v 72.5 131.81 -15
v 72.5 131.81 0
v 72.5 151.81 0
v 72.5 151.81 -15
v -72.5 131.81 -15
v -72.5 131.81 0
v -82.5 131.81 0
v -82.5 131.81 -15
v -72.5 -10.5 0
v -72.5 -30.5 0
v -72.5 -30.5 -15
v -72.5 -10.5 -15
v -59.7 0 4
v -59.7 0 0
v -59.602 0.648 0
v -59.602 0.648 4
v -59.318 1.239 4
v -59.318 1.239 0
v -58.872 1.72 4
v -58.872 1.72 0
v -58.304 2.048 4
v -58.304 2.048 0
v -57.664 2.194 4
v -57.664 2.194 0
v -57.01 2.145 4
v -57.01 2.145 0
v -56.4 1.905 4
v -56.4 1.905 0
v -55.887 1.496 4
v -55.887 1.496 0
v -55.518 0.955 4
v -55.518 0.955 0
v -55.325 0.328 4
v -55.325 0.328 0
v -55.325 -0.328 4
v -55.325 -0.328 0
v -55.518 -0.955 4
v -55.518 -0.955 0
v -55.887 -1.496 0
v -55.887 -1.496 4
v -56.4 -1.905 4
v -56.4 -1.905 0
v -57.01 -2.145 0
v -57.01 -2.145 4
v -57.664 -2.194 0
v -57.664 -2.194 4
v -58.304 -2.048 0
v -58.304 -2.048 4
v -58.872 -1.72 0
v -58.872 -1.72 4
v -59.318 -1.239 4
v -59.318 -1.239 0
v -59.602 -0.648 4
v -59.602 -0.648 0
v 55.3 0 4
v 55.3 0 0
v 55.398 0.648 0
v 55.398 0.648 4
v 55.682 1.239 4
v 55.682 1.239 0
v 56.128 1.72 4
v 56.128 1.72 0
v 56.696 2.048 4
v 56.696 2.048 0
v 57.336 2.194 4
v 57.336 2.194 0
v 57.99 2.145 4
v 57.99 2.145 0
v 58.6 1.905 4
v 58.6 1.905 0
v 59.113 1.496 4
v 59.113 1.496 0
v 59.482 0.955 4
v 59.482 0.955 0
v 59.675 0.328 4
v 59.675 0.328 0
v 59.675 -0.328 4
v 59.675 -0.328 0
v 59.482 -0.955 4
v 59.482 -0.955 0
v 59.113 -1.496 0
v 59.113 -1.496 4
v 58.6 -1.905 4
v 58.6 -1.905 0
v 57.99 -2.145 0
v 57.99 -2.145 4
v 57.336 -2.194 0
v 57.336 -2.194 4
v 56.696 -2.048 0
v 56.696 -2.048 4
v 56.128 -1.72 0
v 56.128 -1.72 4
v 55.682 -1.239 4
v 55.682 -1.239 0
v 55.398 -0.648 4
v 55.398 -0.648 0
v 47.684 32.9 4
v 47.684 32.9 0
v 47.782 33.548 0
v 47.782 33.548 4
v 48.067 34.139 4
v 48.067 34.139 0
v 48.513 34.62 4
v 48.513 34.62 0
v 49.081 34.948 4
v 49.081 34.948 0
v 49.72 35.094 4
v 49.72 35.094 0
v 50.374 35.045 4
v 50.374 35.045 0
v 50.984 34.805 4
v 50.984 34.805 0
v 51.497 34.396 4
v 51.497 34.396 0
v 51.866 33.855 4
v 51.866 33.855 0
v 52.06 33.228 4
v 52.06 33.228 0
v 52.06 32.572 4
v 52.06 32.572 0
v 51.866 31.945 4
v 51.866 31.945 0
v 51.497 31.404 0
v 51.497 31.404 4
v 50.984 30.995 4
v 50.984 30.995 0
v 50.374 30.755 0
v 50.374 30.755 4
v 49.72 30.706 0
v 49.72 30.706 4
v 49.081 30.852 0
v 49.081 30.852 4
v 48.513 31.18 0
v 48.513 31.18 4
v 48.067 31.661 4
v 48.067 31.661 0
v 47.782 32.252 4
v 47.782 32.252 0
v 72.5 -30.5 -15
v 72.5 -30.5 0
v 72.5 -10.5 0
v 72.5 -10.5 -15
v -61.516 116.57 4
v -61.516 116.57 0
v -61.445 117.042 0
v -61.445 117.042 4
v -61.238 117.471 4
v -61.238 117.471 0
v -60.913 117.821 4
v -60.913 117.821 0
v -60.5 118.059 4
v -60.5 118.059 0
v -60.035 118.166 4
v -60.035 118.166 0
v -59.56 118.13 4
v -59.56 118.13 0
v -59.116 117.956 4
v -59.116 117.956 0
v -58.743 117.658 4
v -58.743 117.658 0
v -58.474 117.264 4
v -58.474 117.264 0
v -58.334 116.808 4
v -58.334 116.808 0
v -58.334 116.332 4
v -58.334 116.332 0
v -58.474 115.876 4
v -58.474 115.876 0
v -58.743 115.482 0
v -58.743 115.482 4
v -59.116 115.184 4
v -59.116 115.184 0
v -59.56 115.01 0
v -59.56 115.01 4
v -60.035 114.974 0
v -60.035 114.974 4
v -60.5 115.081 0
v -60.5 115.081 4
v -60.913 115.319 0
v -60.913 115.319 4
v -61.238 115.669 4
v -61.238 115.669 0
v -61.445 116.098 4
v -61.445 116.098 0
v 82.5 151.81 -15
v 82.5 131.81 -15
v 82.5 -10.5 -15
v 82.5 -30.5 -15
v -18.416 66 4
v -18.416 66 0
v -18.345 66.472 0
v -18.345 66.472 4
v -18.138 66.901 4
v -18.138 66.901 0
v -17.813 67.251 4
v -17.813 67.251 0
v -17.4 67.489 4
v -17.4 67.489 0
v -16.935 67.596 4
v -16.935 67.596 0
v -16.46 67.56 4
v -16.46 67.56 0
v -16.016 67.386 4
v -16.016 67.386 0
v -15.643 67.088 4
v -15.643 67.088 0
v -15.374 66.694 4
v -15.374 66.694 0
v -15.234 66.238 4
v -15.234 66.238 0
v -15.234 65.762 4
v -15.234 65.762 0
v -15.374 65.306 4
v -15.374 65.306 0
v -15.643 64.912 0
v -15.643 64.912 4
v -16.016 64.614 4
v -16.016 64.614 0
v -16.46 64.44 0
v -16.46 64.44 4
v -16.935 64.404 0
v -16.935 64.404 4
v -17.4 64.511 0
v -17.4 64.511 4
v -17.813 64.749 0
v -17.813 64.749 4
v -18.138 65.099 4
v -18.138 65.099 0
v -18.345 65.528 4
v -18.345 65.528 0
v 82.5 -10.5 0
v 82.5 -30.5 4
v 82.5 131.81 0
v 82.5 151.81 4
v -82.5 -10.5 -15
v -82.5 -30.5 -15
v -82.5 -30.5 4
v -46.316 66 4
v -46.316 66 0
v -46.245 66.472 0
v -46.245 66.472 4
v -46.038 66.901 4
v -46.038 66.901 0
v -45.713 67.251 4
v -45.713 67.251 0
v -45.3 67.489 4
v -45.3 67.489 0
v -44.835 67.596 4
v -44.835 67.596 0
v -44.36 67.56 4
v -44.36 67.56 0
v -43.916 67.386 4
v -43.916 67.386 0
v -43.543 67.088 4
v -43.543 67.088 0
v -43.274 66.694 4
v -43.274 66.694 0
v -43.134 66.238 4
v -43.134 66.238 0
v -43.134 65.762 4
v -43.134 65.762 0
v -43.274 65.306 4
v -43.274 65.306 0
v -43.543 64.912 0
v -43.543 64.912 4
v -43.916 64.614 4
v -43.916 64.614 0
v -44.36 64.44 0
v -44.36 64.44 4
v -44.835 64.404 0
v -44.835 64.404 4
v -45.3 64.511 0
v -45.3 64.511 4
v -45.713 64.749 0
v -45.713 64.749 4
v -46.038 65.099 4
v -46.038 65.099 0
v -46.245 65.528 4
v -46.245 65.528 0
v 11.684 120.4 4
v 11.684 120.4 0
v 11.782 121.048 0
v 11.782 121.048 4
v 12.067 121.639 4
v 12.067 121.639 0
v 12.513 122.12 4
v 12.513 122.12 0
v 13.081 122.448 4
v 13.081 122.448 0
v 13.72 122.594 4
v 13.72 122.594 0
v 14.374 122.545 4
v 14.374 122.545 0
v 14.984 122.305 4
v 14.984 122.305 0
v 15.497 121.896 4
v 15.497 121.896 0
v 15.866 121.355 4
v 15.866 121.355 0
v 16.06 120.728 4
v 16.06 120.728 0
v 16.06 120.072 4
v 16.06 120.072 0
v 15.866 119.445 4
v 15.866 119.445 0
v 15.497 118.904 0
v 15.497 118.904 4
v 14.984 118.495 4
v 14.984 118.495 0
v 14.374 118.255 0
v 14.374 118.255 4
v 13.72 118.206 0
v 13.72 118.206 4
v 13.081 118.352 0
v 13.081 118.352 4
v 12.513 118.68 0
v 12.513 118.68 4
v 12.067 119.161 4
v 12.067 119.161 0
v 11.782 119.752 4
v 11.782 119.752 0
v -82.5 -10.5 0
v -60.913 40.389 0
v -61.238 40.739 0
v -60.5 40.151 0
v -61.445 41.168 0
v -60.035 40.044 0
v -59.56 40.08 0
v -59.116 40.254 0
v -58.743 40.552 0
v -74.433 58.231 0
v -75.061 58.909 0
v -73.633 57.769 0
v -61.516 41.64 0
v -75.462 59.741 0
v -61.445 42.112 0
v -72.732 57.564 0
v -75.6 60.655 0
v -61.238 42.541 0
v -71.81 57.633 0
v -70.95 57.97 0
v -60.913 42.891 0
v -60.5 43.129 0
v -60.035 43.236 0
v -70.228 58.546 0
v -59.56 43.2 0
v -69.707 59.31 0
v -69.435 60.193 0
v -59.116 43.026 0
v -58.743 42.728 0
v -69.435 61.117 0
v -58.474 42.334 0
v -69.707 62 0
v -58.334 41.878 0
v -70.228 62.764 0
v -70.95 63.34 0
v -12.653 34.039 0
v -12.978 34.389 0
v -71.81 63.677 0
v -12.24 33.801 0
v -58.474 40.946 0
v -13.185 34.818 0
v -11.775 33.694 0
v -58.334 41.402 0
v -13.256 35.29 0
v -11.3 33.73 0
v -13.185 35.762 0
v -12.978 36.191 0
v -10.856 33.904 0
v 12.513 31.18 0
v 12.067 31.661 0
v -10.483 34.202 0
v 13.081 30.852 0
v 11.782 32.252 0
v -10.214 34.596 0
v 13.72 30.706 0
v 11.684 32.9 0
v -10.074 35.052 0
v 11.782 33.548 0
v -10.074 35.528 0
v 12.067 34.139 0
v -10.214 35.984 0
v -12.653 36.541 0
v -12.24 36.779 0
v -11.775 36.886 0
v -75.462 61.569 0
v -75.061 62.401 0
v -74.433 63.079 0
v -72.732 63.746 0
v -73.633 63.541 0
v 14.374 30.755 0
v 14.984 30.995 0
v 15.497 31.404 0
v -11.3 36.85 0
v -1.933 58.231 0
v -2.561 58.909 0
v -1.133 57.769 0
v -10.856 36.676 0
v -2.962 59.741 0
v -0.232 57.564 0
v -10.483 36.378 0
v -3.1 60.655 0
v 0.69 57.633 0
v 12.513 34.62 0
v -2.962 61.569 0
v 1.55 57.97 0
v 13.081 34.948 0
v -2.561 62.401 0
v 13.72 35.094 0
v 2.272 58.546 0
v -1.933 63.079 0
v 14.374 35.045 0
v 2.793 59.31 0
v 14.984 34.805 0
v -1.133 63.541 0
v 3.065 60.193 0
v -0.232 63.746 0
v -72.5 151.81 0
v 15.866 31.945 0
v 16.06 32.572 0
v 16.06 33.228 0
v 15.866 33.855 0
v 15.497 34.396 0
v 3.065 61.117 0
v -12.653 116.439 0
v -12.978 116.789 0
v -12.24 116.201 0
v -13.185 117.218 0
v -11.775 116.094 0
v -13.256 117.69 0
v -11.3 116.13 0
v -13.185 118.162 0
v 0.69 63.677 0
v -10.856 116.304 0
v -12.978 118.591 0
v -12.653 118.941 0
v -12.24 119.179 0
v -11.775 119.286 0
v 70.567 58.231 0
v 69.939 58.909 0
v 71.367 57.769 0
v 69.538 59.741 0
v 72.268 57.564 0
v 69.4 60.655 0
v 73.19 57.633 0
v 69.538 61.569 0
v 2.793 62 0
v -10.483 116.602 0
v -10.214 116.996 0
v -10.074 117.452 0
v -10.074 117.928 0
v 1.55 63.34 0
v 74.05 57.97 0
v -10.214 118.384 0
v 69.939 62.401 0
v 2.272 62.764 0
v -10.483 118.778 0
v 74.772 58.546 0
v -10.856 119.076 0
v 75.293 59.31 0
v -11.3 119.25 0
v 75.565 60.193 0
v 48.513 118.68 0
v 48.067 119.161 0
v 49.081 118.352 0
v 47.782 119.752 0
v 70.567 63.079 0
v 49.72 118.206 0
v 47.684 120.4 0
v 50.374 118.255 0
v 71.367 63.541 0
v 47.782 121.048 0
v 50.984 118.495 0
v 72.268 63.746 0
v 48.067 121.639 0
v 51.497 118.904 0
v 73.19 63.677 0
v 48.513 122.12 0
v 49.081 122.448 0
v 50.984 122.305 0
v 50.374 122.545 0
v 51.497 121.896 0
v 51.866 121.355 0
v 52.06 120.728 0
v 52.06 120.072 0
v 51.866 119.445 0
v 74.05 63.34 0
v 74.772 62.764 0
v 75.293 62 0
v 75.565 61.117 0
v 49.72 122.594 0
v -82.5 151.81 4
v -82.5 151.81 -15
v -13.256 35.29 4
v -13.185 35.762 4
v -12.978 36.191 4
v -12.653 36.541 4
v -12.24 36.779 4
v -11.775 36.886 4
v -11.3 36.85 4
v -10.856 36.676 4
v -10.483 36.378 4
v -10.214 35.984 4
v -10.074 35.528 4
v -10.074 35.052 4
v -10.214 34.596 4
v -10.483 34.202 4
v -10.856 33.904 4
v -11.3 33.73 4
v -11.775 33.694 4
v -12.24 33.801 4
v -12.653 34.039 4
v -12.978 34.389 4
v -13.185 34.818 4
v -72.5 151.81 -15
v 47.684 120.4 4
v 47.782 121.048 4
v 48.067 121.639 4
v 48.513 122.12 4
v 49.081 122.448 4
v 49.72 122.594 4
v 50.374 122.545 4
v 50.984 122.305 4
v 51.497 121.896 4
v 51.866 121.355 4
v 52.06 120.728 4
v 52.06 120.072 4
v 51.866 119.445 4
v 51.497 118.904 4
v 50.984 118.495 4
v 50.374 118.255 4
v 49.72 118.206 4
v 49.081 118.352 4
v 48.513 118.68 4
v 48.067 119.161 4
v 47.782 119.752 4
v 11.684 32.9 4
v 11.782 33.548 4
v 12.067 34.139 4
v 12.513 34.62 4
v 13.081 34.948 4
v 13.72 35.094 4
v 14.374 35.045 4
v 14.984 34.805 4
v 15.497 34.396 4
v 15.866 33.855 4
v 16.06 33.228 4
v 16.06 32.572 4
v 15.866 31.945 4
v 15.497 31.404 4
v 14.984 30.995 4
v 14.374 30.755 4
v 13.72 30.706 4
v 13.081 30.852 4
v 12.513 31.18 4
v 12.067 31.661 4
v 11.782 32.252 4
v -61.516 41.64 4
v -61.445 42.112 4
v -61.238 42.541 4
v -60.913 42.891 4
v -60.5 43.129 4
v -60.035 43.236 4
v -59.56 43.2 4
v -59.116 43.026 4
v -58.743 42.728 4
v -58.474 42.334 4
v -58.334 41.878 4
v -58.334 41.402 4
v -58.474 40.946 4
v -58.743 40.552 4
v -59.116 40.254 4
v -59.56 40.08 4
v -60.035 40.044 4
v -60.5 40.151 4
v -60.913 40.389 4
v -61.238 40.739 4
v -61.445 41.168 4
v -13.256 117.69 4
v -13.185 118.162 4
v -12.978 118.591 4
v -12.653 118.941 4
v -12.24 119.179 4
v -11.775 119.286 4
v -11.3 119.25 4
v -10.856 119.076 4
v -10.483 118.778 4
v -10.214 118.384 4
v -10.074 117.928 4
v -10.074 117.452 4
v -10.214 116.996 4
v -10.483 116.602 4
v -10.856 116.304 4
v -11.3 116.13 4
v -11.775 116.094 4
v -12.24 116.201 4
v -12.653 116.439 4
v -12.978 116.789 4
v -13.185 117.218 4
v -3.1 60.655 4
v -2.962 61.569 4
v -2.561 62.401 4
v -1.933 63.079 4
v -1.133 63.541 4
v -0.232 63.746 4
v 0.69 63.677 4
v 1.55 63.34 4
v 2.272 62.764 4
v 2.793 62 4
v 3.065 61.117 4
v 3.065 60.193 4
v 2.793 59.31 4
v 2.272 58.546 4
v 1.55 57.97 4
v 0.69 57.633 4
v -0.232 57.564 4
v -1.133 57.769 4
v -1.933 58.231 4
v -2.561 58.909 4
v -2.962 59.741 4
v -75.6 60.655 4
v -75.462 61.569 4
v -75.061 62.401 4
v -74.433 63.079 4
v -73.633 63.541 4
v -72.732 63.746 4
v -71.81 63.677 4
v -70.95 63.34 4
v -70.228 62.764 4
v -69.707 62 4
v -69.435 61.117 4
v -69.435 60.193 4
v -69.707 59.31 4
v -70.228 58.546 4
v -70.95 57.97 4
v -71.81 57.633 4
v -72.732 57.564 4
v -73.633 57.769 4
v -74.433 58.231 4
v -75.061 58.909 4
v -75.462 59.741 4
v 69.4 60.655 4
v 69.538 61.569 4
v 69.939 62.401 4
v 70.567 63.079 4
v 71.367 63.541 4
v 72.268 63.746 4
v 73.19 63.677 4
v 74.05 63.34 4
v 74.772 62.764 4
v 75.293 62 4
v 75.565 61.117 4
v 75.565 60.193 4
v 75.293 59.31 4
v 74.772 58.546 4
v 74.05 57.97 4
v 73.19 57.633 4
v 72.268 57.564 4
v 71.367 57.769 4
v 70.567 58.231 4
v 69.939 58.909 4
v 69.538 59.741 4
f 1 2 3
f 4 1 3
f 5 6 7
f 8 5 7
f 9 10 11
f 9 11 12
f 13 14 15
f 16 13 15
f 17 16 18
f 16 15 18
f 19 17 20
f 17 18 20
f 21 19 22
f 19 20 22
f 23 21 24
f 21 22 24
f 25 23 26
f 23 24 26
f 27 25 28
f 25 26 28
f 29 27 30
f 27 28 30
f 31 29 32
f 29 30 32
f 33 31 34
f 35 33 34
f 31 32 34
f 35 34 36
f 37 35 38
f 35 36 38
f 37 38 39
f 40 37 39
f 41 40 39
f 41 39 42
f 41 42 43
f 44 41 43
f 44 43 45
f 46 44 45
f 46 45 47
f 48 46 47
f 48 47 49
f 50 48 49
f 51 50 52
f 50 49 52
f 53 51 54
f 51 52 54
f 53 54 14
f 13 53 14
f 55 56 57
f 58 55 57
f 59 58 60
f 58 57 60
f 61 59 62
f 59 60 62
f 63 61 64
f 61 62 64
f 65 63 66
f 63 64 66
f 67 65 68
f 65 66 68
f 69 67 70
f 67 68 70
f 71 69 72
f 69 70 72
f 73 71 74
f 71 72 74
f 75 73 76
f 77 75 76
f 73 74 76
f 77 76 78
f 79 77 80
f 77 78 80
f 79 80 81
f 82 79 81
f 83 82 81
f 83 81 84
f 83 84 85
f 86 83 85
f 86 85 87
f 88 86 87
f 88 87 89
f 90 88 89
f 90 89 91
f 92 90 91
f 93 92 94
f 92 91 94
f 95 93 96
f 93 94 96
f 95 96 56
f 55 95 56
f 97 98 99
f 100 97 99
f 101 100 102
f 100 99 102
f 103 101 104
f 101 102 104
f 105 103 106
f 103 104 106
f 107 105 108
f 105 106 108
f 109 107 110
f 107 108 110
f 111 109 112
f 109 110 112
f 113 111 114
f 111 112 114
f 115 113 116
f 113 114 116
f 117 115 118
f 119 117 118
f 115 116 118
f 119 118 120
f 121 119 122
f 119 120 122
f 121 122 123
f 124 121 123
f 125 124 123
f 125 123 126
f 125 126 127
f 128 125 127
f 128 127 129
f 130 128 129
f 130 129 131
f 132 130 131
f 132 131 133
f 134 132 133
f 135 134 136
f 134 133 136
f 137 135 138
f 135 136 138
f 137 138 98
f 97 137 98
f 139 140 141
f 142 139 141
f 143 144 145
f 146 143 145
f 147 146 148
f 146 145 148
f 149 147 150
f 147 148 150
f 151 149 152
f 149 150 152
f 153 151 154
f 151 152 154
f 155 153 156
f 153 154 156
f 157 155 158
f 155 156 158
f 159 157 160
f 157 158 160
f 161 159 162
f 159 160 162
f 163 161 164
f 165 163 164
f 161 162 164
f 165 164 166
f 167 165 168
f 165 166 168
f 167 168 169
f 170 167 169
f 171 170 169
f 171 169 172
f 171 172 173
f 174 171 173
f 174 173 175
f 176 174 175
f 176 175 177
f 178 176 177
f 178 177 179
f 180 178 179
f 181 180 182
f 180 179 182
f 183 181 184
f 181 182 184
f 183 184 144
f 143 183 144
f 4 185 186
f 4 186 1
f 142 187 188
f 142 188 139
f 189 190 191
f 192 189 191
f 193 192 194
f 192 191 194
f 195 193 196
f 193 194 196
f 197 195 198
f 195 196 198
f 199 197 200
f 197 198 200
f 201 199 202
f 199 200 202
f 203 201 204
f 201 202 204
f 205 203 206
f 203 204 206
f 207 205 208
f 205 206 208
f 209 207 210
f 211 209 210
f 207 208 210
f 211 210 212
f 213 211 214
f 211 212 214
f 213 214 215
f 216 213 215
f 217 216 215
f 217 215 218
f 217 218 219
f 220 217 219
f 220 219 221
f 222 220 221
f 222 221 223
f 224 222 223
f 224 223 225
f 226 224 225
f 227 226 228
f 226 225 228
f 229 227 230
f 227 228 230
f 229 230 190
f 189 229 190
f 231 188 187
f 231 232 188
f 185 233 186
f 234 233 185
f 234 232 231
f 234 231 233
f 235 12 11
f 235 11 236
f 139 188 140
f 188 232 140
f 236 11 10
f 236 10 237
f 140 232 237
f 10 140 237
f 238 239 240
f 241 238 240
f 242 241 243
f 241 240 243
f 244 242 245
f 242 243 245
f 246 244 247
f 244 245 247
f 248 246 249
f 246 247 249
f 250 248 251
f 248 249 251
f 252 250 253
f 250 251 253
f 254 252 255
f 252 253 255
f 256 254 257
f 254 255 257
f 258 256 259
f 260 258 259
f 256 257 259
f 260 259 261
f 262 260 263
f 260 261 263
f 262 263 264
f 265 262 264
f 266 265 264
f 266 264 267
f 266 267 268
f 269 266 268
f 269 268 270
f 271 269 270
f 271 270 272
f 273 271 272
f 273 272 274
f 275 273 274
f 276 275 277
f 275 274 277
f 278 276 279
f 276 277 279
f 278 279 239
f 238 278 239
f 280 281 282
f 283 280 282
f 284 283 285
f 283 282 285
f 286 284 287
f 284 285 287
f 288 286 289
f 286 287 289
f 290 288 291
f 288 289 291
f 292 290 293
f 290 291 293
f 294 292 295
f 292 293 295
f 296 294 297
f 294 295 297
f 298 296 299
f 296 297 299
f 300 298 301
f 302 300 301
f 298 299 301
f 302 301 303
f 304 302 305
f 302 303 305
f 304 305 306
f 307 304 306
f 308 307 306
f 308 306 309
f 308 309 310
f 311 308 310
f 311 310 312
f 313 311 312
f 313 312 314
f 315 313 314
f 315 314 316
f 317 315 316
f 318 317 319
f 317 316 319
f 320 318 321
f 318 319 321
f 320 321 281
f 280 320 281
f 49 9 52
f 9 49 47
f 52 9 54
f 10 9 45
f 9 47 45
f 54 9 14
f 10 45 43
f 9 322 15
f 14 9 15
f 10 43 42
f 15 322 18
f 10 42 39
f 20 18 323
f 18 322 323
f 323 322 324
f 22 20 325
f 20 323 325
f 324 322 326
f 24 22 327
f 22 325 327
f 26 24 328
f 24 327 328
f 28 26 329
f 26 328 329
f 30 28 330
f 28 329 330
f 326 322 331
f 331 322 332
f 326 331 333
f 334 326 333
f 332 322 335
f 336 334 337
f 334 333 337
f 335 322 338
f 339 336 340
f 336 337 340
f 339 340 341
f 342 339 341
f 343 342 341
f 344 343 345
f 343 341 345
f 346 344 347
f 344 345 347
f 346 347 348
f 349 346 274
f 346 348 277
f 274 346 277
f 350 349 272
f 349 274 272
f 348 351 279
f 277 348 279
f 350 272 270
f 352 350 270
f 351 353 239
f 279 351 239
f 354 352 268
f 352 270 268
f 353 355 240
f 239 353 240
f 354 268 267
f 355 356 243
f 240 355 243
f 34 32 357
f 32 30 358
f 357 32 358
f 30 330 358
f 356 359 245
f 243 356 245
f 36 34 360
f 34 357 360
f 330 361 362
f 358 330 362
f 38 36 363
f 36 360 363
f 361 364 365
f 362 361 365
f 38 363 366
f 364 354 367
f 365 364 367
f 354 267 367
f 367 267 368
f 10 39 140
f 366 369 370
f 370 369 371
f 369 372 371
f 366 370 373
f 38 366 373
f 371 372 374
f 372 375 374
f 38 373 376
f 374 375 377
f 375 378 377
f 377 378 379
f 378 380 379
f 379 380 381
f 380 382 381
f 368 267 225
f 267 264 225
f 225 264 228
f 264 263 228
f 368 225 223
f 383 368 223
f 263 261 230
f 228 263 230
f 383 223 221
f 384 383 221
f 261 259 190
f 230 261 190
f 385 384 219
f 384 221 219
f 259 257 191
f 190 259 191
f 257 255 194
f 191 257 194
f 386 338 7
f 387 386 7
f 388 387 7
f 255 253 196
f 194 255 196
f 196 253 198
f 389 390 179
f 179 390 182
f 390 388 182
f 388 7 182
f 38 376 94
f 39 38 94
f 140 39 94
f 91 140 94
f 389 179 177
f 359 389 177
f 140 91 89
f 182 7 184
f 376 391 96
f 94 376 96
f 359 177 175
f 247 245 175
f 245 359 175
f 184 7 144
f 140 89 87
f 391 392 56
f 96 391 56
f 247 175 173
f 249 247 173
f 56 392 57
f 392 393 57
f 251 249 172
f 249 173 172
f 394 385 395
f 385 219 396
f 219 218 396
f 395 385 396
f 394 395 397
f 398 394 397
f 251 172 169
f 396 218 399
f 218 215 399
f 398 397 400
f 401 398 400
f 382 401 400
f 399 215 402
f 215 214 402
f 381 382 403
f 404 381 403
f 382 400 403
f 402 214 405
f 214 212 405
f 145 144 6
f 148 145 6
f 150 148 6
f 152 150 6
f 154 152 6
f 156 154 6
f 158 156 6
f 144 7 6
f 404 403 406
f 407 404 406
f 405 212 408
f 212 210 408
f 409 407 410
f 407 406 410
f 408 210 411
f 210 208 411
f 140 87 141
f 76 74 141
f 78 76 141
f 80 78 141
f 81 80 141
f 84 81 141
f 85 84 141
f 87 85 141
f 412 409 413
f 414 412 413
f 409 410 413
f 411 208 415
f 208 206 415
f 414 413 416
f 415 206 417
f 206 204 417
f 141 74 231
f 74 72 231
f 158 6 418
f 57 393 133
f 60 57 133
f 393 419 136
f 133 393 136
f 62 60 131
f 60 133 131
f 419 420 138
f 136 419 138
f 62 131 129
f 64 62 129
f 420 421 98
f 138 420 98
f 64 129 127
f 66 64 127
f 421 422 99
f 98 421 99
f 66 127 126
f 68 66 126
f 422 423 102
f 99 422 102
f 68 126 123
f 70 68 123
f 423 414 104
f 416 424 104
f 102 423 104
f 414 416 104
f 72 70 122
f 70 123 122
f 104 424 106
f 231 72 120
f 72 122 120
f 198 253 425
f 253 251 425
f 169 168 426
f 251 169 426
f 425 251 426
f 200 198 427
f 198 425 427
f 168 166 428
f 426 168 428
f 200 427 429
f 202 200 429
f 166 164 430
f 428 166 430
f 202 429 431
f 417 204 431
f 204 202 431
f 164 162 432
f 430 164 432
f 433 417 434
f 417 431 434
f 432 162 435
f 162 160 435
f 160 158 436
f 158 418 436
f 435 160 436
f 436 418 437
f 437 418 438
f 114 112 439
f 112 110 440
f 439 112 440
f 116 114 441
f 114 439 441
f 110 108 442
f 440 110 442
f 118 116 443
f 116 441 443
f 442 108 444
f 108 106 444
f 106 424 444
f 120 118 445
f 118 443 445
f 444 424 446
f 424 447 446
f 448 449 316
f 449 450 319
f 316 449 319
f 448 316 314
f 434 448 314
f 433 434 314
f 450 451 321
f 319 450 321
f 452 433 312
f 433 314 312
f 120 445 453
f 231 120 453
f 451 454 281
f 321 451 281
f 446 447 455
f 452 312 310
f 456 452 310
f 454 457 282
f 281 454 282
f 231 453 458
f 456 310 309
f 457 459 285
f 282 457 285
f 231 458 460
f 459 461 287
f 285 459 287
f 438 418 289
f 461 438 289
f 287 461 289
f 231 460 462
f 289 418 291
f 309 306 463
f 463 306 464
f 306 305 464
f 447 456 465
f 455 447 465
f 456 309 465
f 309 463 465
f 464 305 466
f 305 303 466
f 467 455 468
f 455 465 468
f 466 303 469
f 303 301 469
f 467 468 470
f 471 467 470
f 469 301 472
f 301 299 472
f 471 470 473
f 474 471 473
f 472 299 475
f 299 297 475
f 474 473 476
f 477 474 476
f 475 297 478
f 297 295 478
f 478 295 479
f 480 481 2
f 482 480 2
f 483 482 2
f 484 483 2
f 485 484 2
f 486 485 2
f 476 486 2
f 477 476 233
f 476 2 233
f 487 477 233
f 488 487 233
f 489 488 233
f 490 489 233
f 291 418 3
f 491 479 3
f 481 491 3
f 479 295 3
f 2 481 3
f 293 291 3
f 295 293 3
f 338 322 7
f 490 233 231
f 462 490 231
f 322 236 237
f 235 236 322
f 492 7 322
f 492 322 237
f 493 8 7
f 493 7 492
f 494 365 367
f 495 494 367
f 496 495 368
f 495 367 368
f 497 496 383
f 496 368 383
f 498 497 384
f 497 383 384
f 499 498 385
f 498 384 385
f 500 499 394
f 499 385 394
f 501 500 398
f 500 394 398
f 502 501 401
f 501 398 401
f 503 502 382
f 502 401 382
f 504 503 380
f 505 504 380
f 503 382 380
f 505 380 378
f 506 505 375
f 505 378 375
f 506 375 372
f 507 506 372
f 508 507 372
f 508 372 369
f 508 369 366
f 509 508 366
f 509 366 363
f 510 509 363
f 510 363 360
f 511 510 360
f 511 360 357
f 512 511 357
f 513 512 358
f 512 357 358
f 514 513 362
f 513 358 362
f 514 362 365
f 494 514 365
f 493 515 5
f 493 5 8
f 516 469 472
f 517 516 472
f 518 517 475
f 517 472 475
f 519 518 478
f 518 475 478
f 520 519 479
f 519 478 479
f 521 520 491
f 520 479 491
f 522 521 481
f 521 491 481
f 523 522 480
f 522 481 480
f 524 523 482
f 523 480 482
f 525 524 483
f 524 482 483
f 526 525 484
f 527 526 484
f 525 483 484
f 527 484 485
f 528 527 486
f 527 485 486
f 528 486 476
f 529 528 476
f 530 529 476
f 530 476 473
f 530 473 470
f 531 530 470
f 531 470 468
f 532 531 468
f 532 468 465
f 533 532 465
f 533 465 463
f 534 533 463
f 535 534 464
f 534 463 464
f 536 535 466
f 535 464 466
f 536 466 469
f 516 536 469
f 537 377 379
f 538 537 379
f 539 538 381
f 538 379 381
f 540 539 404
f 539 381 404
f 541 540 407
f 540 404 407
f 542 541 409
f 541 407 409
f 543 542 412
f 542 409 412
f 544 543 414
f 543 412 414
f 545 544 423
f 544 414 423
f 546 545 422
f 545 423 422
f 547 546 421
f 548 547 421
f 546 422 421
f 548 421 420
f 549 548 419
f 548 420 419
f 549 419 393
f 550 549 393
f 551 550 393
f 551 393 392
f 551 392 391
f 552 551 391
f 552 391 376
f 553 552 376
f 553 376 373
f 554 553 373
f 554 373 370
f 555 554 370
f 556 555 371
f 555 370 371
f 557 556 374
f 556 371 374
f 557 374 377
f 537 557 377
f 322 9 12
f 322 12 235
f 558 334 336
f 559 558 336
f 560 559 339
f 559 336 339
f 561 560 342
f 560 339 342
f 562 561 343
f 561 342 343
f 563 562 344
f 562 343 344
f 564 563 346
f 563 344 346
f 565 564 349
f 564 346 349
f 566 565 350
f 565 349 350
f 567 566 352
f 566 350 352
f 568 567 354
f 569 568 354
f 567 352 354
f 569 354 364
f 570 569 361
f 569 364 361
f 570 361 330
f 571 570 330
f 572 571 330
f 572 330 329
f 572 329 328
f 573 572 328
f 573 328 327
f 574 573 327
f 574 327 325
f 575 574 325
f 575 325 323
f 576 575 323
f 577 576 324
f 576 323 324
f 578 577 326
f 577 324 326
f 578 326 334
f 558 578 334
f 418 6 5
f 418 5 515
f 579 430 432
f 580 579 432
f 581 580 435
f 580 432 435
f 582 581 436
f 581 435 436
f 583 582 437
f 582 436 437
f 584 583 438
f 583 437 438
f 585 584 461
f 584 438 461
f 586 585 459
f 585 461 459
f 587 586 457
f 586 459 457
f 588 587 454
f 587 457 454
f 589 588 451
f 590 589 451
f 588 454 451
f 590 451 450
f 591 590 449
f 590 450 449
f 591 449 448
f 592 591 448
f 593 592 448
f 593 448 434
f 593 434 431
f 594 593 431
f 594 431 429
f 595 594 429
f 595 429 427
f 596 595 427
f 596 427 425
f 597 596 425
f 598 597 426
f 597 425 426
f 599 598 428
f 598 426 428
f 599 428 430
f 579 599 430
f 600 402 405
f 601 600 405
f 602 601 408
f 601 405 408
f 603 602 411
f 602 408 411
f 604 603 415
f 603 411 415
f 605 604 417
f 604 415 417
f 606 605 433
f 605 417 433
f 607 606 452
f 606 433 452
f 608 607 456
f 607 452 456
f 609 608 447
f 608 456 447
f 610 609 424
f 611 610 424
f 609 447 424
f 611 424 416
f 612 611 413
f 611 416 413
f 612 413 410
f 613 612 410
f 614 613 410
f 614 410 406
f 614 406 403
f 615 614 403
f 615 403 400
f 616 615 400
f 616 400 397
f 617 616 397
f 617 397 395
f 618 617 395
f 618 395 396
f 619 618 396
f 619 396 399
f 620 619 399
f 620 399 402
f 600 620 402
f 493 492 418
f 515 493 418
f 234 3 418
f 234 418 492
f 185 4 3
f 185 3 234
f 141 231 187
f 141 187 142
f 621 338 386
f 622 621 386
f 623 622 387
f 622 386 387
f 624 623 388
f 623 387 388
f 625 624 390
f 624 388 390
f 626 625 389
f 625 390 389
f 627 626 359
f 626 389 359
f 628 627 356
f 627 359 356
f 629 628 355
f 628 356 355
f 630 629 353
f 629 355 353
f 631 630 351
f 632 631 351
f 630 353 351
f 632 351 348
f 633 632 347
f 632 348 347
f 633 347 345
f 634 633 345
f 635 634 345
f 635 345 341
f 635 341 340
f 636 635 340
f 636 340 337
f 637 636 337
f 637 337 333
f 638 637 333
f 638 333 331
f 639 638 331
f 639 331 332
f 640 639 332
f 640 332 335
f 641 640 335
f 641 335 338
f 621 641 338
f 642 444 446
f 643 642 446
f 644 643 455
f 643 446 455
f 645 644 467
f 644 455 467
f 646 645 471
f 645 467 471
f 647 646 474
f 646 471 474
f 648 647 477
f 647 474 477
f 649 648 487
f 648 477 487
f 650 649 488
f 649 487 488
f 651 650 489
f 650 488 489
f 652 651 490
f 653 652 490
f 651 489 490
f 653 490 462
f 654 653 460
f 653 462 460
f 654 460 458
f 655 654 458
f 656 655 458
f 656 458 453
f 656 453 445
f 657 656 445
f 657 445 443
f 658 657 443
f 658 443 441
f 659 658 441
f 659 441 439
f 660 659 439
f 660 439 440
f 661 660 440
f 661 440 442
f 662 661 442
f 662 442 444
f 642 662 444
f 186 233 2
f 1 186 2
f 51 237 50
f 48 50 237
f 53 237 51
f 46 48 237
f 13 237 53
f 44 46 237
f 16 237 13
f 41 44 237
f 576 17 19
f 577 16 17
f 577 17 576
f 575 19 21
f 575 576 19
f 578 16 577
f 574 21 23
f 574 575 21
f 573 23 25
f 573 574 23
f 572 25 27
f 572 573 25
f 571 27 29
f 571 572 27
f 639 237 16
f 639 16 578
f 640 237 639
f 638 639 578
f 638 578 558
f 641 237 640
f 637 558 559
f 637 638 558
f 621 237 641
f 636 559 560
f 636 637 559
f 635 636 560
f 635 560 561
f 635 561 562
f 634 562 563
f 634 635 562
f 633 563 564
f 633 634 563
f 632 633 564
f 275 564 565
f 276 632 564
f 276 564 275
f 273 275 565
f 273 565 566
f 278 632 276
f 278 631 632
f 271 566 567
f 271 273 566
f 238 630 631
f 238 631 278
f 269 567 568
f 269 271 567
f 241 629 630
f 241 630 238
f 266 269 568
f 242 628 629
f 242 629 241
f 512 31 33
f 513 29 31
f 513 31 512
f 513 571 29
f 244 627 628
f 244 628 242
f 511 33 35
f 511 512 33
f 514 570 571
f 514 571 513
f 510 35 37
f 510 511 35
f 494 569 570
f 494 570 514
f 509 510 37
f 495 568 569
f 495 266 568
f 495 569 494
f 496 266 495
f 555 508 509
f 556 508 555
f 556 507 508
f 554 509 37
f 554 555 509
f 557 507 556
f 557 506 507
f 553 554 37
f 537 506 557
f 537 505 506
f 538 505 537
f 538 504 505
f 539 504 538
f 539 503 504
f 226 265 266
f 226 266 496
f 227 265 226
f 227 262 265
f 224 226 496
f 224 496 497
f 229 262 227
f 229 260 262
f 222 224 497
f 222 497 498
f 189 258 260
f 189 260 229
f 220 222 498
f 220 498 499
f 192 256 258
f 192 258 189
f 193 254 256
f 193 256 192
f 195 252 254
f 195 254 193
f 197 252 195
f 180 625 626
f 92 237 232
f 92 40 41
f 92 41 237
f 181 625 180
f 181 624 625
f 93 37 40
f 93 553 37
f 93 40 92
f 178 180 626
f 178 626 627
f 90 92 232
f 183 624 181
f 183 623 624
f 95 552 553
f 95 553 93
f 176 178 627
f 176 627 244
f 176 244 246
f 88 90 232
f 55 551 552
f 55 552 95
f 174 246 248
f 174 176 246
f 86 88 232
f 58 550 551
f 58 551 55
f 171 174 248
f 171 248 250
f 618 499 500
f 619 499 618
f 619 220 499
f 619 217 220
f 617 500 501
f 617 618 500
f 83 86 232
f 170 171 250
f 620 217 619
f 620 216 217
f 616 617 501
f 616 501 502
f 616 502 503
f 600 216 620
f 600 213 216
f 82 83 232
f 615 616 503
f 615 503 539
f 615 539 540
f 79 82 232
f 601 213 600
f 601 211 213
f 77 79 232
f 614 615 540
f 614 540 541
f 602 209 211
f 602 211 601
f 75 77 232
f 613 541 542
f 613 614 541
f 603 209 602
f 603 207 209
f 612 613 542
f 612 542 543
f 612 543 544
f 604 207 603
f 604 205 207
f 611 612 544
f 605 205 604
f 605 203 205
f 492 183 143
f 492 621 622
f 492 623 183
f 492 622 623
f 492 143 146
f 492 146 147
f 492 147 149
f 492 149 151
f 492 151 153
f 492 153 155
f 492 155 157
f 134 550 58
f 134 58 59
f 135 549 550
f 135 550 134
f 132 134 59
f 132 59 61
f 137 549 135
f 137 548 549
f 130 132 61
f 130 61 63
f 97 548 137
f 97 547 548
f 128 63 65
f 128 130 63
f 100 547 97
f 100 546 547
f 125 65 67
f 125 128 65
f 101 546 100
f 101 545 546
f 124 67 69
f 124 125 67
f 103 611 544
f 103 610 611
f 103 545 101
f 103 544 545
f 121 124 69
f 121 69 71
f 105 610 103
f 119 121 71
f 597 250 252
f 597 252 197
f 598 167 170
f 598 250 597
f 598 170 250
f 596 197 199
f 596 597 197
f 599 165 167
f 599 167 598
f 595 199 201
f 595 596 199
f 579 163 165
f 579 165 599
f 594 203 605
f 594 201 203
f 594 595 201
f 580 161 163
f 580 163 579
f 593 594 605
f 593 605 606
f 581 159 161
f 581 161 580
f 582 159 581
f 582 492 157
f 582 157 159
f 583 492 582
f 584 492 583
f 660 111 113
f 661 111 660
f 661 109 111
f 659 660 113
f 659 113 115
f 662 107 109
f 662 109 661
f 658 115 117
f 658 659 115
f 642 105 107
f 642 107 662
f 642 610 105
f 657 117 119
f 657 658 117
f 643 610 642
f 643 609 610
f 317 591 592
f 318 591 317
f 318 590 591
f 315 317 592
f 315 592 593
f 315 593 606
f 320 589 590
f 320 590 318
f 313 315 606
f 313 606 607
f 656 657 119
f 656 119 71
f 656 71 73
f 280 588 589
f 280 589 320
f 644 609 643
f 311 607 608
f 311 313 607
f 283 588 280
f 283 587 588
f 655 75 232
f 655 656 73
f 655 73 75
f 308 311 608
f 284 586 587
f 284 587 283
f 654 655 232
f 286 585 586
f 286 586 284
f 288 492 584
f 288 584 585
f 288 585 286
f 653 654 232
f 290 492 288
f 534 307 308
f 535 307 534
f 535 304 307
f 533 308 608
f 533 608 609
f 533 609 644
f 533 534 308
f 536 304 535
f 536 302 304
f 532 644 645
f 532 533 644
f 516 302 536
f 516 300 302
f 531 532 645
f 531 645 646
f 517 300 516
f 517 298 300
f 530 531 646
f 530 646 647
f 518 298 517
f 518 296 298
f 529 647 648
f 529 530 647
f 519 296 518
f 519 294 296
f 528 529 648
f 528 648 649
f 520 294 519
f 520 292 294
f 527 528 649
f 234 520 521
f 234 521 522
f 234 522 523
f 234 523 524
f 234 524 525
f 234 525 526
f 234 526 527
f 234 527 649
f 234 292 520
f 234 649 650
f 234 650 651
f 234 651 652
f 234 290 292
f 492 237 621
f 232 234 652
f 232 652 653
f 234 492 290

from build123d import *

# Parameters (mm, degrees)
SKETCH1_W           = 165
SKETCH1_H           = 182.31
BOSS_EXTRUDE1_DEPTH = 4
SKETCH2_R           = 2.2
SKETCH2_R_2         = 1.6
CUT_EXTRUDE1_DEPTH  = 4
SKETCH3_W           = 10
SKETCH3_H           = 20
BOSS_EXTRUDE2_DEPTH = 15
CUT_EXTRUDE2_REACH  = 175.429
SKETCH4_R           = 3.1


with BuildPart() as part:
    # Sketch1 → Boss-Extrude1 (new body)
    with BuildSketch(Plane.XY):
        with Locations((0, 60.655)):
            Rectangle(SKETCH1_W, SKETCH1_H)
    extrude(amount=BOSS_EXTRUDE1_DEPTH)

    # Sketch2 → Cut-Extrude1 (cut)
    with BuildSketch(Plane(origin=(0, 0, 0), x_dir=(-1, 0, 0), z_dir=(0, 0, -1))):
        with Locations((-49.884295567, 120.4)):
            Circle(SKETCH2_R)
        with Locations((-49.884295567, 32.9)):
            Circle(SKETCH2_R)
        with Locations((-13.884295567, 32.9)):
            Circle(SKETCH2_R)
        with Locations((-13.884295567, 120.4)):
            Circle(SKETCH2_R)
        with Locations((57.5, 0)):
            Circle(SKETCH2_R)
        with Locations((-57.5, 0)):
            Circle(SKETCH2_R)
        with Locations((11.655704433, 35.29)):
            Circle(SKETCH2_R_2)
        with Locations((16.815704433, 66)):
            Circle(SKETCH2_R_2)
        with Locations((11.655704433, 117.69)):
            Circle(SKETCH2_R_2)
        with Locations((59.915704433, 116.57)):
            Circle(SKETCH2_R_2)
        with Locations((44.715704433, 66)):
            Circle(SKETCH2_R_2)
        with Locations((59.915704433, 41.64)):
            Circle(SKETCH2_R_2)
    extrude(amount=-CUT_EXTRUDE1_DEPTH, mode=Mode.SUBTRACT)

    # Sketch3 → Boss-Extrude2 (add)
    with BuildSketch(Plane(origin=(0, 0, 0), x_dir=(-1, 0, 0), z_dir=(0, 0, -1))):
        with Locations((-77.5, -20.5)):
            Rectangle(SKETCH3_W, SKETCH3_H)
        with Locations((-77.5, 141.81)):
            Rectangle(SKETCH3_W, SKETCH3_H)
        with Locations((77.5, -20.5)):
            Rectangle(SKETCH3_W, SKETCH3_H)
        with Locations((77.5, 141.81)):
            Rectangle(SKETCH3_W, SKETCH3_H)
    extrude(amount=BOSS_EXTRUDE2_DEPTH)

    # Sketch4 → Cut-Extrude2 (cut, up to next)
    with BuildSketch(Plane(origin=(0, 0, 0), x_dir=(-1, 0, 0), z_dir=(0, 0, -1)), mode=Mode.PRIVATE) as cut_extrude2_sk1:
        with Locations((-72.5, 60.655)):
            Circle(SKETCH4_R)
    cut_extrude2_tool1 = extrude(cut_extrude2_sk1.sketch, amount=-CUT_EXTRUDE2_REACH, mode=Mode.PRIVATE) & part.part
    # Sketch4 → Cut-Extrude2 (cut, up to next)
    with BuildSketch(Plane(origin=(0, 0, 0), x_dir=(-1, 0, 0), z_dir=(0, 0, -1)), mode=Mode.PRIVATE) as cut_extrude2_sk2:
        with Locations((72.5, 60.655)):
            Circle(SKETCH4_R)
    cut_extrude2_tool2 = extrude(cut_extrude2_sk2.sketch, amount=-CUT_EXTRUDE2_REACH, mode=Mode.PRIVATE) & part.part
    # Sketch4 → Cut-Extrude2 (cut, up to next)
    with BuildSketch(Plane(origin=(0, 0, 0), x_dir=(-1, 0, 0), z_dir=(0, 0, -1)), mode=Mode.PRIVATE) as cut_extrude2_sk3:
        with Locations((0, 60.655)):
            Circle(SKETCH4_R)
    cut_extrude2_tool3 = extrude(cut_extrude2_sk3.sketch, amount=-CUT_EXTRUDE2_REACH, mode=Mode.PRIVATE) & part.part
    add(cut_extrude2_tool1.solids().sort_by_distance((72.5, 60.655, 0))[0], mode=Mode.SUBTRACT)
    add(cut_extrude2_tool2.solids().sort_by_distance((-72.5, 60.655, 0))[0], mode=Mode.SUBTRACT)
    add(cut_extrude2_tool3.solids().sort_by_distance((0, 60.655, 0))[0], mode=Mode.SUBTRACT)


solid = part.part
